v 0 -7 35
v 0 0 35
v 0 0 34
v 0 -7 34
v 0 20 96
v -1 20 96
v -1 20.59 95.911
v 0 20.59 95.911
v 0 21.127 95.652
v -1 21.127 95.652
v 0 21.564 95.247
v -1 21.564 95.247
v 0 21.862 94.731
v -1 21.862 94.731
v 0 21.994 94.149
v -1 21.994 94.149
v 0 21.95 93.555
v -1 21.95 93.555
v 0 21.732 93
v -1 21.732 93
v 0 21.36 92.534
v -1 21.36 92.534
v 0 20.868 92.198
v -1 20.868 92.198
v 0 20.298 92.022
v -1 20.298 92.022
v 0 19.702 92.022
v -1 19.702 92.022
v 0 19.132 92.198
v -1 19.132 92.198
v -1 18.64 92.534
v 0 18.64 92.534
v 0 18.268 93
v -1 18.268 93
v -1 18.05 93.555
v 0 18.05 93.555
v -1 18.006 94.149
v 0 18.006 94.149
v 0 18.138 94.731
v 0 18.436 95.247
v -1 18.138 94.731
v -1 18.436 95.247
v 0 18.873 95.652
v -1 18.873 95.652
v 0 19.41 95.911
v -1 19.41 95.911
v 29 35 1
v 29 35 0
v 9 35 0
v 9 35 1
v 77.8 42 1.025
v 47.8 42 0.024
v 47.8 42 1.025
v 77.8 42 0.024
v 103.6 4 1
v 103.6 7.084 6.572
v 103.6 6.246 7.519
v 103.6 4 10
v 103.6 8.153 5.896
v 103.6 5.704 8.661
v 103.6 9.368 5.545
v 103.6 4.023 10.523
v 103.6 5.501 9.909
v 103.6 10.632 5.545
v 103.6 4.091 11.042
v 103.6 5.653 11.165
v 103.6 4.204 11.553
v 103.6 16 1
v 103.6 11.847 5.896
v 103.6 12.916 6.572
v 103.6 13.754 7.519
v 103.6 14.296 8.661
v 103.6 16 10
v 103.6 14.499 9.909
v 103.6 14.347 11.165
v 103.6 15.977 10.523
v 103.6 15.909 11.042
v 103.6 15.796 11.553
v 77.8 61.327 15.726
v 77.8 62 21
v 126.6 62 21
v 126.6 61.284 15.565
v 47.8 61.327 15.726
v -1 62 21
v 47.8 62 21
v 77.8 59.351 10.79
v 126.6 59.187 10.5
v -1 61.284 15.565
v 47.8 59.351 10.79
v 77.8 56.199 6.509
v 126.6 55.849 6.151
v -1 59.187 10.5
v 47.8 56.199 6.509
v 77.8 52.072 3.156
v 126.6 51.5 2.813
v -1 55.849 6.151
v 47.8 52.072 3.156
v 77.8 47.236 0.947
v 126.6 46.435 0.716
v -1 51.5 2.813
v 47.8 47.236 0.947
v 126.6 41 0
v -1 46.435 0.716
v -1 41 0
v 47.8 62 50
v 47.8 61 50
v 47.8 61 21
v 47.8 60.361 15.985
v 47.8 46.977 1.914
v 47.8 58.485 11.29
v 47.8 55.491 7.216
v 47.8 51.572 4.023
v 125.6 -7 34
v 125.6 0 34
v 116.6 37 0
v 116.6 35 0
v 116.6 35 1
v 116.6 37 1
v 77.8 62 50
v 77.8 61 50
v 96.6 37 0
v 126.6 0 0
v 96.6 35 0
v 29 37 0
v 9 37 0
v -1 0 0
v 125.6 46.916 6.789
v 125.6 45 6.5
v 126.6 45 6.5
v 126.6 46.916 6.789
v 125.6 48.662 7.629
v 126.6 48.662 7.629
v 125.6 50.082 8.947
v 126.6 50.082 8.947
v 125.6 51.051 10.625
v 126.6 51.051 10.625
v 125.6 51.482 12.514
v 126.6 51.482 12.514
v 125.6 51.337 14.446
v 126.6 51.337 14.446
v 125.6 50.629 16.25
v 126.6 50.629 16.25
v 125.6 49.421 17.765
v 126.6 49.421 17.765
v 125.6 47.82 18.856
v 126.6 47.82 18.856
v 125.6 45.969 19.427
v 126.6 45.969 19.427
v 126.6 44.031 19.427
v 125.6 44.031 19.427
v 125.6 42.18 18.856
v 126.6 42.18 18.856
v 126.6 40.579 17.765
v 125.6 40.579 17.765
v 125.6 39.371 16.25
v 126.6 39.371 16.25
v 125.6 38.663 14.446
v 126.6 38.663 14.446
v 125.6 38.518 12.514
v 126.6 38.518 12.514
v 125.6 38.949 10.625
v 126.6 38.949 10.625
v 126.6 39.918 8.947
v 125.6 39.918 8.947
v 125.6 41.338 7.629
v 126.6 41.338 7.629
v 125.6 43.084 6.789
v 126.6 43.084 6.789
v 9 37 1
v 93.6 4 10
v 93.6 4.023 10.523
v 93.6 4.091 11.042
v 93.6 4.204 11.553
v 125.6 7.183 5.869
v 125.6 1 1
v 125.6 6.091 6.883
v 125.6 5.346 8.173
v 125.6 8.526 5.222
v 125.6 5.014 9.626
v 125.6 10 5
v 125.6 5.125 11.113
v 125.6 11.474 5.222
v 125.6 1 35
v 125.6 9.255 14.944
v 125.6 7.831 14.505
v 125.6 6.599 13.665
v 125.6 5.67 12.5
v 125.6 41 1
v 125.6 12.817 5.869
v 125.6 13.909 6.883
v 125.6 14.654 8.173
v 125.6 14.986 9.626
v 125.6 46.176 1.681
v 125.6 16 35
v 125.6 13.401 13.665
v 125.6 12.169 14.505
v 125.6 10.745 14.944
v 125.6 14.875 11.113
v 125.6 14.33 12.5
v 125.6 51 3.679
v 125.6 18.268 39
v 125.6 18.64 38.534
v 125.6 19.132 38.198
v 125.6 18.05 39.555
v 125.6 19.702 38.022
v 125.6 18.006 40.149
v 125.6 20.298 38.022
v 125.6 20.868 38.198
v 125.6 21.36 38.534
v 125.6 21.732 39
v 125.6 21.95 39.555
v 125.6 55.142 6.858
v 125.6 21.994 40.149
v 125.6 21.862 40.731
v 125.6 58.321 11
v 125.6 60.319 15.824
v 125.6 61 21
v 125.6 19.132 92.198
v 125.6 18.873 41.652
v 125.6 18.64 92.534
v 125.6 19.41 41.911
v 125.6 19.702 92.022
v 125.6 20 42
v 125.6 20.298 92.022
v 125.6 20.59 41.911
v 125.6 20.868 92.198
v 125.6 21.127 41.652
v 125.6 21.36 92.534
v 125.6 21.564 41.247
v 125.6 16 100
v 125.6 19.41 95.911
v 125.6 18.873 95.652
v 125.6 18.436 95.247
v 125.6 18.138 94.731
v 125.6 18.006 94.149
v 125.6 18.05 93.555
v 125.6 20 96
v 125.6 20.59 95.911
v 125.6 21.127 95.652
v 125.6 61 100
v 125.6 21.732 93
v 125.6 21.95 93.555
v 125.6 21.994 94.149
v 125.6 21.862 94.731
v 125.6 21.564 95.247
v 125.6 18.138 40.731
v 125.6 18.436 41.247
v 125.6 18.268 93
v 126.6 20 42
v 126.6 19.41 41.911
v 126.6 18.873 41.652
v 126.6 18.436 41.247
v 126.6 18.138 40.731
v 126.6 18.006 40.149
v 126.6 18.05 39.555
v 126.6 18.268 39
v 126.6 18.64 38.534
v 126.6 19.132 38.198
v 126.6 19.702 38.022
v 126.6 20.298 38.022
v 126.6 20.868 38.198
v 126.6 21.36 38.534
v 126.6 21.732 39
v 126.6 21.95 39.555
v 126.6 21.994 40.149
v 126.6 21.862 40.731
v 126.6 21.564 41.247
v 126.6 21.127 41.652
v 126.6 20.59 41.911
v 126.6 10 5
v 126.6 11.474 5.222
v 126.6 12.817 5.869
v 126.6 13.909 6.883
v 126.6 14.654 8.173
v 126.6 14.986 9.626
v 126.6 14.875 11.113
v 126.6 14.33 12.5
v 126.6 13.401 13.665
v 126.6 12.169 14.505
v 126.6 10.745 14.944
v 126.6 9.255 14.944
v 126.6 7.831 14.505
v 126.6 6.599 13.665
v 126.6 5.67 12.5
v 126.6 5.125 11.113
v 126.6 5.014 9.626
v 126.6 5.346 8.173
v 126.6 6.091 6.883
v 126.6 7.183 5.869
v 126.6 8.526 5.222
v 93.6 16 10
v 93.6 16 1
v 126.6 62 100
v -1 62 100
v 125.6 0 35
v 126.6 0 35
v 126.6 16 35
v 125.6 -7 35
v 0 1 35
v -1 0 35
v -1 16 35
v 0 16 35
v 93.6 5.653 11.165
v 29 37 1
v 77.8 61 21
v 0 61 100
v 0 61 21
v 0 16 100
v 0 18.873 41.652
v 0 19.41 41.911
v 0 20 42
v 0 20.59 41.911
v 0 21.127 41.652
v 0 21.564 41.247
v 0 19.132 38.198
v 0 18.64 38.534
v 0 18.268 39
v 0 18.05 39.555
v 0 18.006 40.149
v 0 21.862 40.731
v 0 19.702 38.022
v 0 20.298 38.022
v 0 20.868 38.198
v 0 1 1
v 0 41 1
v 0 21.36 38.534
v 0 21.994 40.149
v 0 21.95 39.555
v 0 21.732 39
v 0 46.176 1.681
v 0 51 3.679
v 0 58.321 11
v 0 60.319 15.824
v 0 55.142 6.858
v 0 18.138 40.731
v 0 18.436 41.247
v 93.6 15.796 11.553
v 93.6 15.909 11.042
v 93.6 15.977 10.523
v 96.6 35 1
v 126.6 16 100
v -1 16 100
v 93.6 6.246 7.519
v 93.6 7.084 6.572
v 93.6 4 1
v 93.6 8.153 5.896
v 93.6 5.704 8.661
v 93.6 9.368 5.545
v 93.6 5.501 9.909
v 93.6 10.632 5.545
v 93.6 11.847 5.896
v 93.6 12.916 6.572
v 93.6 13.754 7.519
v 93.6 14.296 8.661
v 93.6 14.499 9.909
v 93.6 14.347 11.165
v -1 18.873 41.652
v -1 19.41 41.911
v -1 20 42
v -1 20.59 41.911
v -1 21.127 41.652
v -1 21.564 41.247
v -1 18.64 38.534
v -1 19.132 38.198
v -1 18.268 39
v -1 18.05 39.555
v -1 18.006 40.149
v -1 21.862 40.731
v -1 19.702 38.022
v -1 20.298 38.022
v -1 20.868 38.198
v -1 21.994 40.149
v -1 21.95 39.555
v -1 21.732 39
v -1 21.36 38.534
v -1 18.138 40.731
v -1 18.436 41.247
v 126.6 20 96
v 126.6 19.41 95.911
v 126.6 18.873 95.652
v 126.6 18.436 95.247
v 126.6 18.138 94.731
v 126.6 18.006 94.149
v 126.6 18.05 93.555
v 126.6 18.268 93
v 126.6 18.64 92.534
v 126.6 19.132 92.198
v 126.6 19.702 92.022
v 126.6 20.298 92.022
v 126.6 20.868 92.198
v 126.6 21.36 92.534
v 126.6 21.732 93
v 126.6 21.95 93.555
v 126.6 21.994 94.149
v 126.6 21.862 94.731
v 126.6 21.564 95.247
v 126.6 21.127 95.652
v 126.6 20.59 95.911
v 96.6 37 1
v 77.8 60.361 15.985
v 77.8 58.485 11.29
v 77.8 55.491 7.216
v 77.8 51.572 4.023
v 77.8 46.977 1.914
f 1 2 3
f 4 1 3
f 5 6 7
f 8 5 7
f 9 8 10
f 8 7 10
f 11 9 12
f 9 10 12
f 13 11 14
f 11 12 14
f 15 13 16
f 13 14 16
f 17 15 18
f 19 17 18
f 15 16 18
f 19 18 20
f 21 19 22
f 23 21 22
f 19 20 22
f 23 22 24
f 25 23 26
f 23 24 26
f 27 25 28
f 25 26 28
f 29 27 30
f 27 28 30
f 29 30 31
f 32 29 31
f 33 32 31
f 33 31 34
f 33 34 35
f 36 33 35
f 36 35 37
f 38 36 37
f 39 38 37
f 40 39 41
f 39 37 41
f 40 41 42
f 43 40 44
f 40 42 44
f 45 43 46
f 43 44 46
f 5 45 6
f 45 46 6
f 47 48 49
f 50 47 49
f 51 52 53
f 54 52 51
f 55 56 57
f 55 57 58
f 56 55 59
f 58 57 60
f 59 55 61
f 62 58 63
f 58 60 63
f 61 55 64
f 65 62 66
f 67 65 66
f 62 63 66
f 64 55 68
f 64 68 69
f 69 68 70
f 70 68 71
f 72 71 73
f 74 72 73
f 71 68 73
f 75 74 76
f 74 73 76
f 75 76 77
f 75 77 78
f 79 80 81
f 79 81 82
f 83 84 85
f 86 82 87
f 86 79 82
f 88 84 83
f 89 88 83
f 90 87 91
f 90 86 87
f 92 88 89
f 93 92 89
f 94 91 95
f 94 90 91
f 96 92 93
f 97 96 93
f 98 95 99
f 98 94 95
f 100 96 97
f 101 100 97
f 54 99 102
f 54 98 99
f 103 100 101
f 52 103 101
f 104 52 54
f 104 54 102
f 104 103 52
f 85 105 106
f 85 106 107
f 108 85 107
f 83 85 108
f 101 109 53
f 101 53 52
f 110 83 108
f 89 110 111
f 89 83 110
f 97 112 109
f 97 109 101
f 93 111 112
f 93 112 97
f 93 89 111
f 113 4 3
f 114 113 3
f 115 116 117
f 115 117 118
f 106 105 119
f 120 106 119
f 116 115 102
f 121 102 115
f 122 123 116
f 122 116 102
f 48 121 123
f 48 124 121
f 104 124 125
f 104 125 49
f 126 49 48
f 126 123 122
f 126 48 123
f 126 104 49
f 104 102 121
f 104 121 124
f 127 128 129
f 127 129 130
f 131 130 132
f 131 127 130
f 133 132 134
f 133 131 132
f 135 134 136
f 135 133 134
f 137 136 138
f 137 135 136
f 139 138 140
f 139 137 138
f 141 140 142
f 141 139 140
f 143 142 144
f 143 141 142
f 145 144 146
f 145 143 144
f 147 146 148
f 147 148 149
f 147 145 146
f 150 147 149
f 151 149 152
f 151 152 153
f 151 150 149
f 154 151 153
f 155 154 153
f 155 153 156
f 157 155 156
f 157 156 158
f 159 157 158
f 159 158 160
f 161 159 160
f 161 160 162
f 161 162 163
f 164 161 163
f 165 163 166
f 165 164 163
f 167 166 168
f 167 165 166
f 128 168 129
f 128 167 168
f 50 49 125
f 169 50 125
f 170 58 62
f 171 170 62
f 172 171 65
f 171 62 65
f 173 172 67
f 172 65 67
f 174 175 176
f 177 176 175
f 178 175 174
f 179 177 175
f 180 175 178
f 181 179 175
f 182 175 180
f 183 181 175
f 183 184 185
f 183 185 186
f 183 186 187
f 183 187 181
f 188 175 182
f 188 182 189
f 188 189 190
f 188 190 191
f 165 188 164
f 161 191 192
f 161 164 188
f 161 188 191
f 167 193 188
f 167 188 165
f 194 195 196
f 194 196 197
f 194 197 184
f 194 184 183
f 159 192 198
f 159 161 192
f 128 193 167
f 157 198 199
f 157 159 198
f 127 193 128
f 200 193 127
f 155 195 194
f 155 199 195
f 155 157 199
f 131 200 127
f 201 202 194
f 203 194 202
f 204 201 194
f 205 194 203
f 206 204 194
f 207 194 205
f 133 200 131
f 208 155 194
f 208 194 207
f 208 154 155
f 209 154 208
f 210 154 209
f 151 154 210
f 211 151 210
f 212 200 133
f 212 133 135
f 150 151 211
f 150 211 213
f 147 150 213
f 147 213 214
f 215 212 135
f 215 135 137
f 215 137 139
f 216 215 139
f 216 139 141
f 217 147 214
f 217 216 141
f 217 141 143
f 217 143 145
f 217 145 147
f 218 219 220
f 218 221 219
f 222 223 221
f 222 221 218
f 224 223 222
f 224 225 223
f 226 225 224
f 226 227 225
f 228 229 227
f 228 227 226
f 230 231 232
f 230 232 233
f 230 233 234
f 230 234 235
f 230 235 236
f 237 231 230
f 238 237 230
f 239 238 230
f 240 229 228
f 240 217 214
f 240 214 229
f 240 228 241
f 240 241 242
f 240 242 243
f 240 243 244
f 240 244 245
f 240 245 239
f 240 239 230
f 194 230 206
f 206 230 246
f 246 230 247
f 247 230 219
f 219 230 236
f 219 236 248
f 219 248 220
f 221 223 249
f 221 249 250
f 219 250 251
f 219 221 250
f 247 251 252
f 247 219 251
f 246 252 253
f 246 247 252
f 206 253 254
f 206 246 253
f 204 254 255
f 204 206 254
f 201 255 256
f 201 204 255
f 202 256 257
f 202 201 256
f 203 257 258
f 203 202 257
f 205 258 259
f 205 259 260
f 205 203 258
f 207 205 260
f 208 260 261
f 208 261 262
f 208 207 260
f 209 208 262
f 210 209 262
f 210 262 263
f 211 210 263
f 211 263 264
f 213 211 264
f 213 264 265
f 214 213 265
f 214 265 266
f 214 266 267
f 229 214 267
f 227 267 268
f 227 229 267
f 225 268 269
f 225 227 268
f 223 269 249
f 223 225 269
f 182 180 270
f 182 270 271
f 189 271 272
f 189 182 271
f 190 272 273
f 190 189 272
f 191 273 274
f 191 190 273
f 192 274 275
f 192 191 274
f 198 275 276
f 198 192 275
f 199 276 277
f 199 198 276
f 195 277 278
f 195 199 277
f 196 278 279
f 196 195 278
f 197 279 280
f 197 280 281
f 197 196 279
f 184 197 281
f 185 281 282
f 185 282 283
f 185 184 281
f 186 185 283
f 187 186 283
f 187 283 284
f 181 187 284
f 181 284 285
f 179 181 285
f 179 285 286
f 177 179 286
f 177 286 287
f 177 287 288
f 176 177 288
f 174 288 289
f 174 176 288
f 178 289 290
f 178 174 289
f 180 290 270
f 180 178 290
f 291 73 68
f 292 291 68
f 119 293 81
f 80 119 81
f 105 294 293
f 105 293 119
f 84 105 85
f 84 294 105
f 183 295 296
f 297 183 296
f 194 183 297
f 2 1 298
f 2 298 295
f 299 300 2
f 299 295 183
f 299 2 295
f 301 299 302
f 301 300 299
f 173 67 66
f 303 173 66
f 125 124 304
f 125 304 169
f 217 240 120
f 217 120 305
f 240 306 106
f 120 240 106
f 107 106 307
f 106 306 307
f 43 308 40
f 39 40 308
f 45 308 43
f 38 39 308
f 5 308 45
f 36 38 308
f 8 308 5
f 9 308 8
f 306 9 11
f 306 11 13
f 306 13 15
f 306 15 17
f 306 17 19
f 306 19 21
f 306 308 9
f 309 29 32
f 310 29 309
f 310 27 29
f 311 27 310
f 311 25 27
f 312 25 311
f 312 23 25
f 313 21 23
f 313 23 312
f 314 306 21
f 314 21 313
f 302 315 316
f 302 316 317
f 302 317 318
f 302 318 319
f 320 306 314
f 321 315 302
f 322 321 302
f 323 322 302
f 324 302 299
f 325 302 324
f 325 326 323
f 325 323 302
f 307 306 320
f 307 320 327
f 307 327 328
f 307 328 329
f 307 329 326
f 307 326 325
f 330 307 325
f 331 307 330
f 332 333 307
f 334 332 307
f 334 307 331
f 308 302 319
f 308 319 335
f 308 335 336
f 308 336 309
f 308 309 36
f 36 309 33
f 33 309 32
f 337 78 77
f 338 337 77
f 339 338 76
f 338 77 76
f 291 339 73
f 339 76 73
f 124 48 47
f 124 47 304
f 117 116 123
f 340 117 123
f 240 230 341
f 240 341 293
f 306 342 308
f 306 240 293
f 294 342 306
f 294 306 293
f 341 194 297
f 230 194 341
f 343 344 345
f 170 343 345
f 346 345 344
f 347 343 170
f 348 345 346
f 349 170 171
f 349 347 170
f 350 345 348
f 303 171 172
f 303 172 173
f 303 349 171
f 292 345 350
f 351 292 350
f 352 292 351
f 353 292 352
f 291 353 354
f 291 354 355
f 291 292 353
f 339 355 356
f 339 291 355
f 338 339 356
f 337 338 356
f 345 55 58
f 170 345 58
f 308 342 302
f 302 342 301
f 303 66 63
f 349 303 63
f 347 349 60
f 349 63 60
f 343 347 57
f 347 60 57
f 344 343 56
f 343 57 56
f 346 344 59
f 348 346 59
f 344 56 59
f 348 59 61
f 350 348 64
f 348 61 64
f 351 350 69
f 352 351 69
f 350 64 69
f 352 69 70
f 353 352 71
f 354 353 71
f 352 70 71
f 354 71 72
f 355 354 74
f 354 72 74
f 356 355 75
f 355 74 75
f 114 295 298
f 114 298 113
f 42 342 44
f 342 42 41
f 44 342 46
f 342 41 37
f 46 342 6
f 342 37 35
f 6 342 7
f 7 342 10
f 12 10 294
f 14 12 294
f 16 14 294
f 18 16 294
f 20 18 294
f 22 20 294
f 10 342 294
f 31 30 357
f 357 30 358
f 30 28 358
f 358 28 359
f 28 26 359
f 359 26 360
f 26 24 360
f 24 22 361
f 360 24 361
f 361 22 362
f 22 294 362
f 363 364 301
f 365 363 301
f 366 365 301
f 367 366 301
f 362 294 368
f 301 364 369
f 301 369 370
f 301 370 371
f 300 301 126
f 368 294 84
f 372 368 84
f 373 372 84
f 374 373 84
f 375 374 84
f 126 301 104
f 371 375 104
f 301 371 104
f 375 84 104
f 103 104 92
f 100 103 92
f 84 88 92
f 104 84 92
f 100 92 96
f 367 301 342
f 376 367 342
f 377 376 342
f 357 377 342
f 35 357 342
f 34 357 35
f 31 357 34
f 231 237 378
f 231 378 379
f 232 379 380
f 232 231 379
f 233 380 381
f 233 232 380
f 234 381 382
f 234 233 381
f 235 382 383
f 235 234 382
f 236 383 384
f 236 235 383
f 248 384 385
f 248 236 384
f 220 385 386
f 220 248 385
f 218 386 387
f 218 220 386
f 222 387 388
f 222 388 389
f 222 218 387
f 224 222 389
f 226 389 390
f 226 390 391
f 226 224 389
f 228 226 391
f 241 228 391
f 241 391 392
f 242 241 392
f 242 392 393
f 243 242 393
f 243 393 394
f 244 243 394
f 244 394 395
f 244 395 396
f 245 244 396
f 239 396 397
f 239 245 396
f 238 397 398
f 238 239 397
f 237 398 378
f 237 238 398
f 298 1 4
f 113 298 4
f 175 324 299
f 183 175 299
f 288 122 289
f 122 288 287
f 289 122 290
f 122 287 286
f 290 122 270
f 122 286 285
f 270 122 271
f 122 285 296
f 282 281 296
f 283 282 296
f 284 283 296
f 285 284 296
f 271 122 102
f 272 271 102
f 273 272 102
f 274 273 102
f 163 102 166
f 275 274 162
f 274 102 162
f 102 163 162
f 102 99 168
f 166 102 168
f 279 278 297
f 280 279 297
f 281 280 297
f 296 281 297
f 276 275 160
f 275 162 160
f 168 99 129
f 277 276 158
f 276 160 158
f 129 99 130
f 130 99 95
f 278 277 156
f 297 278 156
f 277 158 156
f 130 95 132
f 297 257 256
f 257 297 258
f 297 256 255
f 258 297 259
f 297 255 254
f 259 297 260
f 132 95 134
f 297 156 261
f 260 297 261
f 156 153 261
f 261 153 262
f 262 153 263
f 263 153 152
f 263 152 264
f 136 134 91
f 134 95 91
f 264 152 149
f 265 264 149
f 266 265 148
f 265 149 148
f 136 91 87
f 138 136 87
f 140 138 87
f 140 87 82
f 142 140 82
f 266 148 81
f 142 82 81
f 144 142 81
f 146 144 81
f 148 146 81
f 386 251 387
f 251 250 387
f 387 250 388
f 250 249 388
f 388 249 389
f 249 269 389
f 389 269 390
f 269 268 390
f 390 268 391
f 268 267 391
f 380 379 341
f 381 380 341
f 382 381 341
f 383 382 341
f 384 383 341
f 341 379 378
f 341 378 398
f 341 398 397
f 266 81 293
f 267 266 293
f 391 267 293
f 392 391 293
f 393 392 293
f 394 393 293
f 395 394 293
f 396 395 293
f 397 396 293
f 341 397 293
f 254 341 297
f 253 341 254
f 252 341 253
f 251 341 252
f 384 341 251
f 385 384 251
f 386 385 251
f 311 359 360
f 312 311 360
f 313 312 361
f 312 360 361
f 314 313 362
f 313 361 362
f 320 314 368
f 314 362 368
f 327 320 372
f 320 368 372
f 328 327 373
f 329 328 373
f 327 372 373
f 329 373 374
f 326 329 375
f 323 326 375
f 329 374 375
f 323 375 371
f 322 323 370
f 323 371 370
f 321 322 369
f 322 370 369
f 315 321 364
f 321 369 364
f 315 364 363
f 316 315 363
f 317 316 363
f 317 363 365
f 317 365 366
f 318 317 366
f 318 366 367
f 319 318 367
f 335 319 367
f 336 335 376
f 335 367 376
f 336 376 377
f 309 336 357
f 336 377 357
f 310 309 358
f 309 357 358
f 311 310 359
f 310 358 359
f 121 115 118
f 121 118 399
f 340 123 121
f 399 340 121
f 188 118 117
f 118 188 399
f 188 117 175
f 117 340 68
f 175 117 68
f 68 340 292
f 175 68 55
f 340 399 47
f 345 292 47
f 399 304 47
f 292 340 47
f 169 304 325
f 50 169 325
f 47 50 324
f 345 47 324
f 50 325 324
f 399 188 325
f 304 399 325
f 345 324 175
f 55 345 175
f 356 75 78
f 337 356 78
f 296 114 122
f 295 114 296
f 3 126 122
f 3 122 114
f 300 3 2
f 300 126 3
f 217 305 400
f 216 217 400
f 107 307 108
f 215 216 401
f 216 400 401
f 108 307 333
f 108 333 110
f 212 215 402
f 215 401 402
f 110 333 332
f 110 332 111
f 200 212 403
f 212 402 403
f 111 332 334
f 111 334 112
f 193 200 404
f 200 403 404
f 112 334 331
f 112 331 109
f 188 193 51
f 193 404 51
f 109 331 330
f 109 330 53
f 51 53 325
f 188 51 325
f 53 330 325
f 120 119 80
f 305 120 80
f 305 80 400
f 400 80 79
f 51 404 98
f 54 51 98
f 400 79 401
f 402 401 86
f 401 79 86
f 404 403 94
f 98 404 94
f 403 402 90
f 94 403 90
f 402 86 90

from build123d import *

# Parameters (mm, degrees)
EXTRUDE_1_DEPTH     = 125.6
EXTRUDE_START       = 1
SKETCH_2_R          = 2
EXTRUDE_2_DEPTH     = 1
SKETCH_3_R          = 2
SKETCH_3_R_2        = 6.5
SKETCH_3_R_3        = 5
EXTRUDE_3_DEPTH     = 1
SKETCH_4_W          = 30
SKETCH_4_H          = 50
CUT_EXTRUDE_1_DEPTH = 20
CUT_EXTRUDE_2_REACH = 174.834
SKETCH_5_W          = 20
SKETCH_5_H          = 2
EXTRUDE_START_2     = -23
EXTRUDE_4_DEPTH     = 10


with BuildPart() as part:
    # 草图1 → 凸台-拉伸1 (new body)
    with BuildSketch(Plane(origin=(0, 0, 0), x_dir=(0, 0, -1), z_dir=(1, 0, 0))):
        with BuildLine():
            Line((0, 0), (0, 41))
            ThreePointArc((0, 41), (-6.150757595, 55.849242405), (-21, 62))
            Line((-21, 62), (-100, 62))
            Line((-100, 62), (-100, 61))
            Line((-100, 61), (-21, 61))
            ThreePointArc((-21, 61), (-6.857864376, 55.142135624), (-1, 41))
            Line((-1, 41), (-1, 1))
            Line((-1, 1), (-35, 1))
            Line((-35, 1), (-35, -7))
            Line((-35, -7), (-34, -7))
            Line((-34, -7), (-34, 0))
            Line((-34, 0), (0, 0))
        make_face()
    extrude(amount=EXTRUDE_1_DEPTH)

    # 草图2 → 凸台-拉伸2 (add)
    with BuildSketch(Plane.ZY.offset(EXTRUDE_START)):
        with BuildLine():
            Line((35, 0), (0, 0))
            Line((0, 0), (0, 41))
            ThreePointArc((0, 41), (6.150757595, 55.849242405), (21, 62))
            Line((21, 62), (100, 62))
            Line((100, 62), (100, 16))
            Line((100, 16), (35, 16))
            Line((35, 16), (35, 0))
        make_face()
        with Locations((94, 20)):
            Circle(SKETCH_2_R, mode=Mode.SUBTRACT)
        with Locations((40, 20)):
            Circle(SKETCH_2_R, mode=Mode.SUBTRACT)
    extrude(amount=-EXTRUDE_2_DEPTH)

    # 草图3 → 凸台-拉伸3 (add)
    with BuildSketch(Plane(origin=(125.6, 0, 0), x_dir=(0, 0, -1), z_dir=(1, 0, 0))):
        with BuildLine():
            Line((-35, 16), (-100, 16))
            Line((-100, 16), (-100, 62))
            Line((-100, 62), (-21, 62))
            ThreePointArc((-21, 62), (-6.150757595, 55.849242405), (0, 41))
            Line((0, 41), (0, 0))
            Line((0, 0), (-35, 0))
            Line((-35, 0), (-35, 16))
        make_face()
        with Locations(Location((-94, 20, 0), (0, 0, 180))):
            Circle(SKETCH_3_R, mode=Mode.SUBTRACT)
        with Locations(Location((-40, 20, 0), (0, 0, 180))):
            Circle(SKETCH_3_R, mode=Mode.SUBTRACT)
        with Locations((-13, 45)):
            Circle(SKETCH_3_R_2, mode=Mode.SUBTRACT)
        with Locations((-10, 10)):
            Circle(SKETCH_3_R_3, mode=Mode.SUBTRACT)
    extrude(amount=EXTRUDE_3_DEPTH)

    # 草图4 → 切除-拉伸1 (cut)
    with BuildSketch(Plane(origin=(0, 62, 0), x_dir=(1, 0, 0), z_dir=(0, 1, 0))):
        with Locations((62.8, -25)):
            Rectangle(SKETCH_4_W, SKETCH_4_H)
    extrude(amount=-CUT_EXTRUDE_1_DEPTH, mode=Mode.SUBTRACT)

    # 草图5 → 切除-拉伸2 (cut, up to next)
    with BuildSketch(Plane(origin=(0, 0, 0), x_dir=(-1, 0, 0), z_dir=(0, 0, -1)), mode=Mode.PRIVATE) as cut_extrude_2_sk1:
        with Locations((-106.6, 36)):
            Rectangle(SKETCH_5_W, SKETCH_5_H)
    cut_extrude_2_tool1 = extrude(cut_extrude_2_sk1.sketch, amount=-CUT_EXTRUDE_2_REACH, mode=Mode.PRIVATE) & part.part
    # 草图5 → 切除-拉伸2 (cut, up to next)
    with BuildSketch(Plane(origin=(0, 0, 0), x_dir=(-1, 0, 0), z_dir=(0, 0, -1)), mode=Mode.PRIVATE) as cut_extrude_2_sk2:
        with Locations((-19, 36)):
            Rectangle(SKETCH_5_W, SKETCH_5_H)
    cut_extrude_2_tool2 = extrude(cut_extrude_2_sk2.sketch, amount=-CUT_EXTRUDE_2_REACH, mode=Mode.PRIVATE) & part.part
    add(cut_extrude_2_tool1.solids().sort_by_distance((106.6, 36, 0))[0], mode=Mode.SUBTRACT)
    add(cut_extrude_2_tool2.solids().sort_by_distance((19, 36, 0))[0], mode=Mode.SUBTRACT)

    # 草图6 → 凸台-拉伸4 (add)
    with BuildSketch(Plane(origin=(126.6, 0, 0), x_dir=(0, 0, -1), z_dir=(1, 0, 0)).offset(EXTRUDE_START_2)):
        with BuildLine():
            Line((-10, 16), (0, 16))
            Line((0, 16), (0, 4))
            Line((0, 4), (-10, 4))
            ThreePointArc((-10, 4), (-10.783157153, 4.051330832), (-11.552914271, 4.204445042))
            Line((-11.552914271, 4.204445042), (-11.164685703, 5.653333782))
            ThreePointArc((-11.164685703, 5.653333782), (-5.5, 10), (-11.164685703, 14.346666218))
            Line((-11.164685703, 14.346666218), (-11.552914271, 15.795554958))
            ThreePointArc((-11.552914271, 15.795554958), (-10.783157153, 15.948669168), (-10, 16))
        make_face()
    extrude(amount=-EXTRUDE_4_DEPTH)


solid = part.part
